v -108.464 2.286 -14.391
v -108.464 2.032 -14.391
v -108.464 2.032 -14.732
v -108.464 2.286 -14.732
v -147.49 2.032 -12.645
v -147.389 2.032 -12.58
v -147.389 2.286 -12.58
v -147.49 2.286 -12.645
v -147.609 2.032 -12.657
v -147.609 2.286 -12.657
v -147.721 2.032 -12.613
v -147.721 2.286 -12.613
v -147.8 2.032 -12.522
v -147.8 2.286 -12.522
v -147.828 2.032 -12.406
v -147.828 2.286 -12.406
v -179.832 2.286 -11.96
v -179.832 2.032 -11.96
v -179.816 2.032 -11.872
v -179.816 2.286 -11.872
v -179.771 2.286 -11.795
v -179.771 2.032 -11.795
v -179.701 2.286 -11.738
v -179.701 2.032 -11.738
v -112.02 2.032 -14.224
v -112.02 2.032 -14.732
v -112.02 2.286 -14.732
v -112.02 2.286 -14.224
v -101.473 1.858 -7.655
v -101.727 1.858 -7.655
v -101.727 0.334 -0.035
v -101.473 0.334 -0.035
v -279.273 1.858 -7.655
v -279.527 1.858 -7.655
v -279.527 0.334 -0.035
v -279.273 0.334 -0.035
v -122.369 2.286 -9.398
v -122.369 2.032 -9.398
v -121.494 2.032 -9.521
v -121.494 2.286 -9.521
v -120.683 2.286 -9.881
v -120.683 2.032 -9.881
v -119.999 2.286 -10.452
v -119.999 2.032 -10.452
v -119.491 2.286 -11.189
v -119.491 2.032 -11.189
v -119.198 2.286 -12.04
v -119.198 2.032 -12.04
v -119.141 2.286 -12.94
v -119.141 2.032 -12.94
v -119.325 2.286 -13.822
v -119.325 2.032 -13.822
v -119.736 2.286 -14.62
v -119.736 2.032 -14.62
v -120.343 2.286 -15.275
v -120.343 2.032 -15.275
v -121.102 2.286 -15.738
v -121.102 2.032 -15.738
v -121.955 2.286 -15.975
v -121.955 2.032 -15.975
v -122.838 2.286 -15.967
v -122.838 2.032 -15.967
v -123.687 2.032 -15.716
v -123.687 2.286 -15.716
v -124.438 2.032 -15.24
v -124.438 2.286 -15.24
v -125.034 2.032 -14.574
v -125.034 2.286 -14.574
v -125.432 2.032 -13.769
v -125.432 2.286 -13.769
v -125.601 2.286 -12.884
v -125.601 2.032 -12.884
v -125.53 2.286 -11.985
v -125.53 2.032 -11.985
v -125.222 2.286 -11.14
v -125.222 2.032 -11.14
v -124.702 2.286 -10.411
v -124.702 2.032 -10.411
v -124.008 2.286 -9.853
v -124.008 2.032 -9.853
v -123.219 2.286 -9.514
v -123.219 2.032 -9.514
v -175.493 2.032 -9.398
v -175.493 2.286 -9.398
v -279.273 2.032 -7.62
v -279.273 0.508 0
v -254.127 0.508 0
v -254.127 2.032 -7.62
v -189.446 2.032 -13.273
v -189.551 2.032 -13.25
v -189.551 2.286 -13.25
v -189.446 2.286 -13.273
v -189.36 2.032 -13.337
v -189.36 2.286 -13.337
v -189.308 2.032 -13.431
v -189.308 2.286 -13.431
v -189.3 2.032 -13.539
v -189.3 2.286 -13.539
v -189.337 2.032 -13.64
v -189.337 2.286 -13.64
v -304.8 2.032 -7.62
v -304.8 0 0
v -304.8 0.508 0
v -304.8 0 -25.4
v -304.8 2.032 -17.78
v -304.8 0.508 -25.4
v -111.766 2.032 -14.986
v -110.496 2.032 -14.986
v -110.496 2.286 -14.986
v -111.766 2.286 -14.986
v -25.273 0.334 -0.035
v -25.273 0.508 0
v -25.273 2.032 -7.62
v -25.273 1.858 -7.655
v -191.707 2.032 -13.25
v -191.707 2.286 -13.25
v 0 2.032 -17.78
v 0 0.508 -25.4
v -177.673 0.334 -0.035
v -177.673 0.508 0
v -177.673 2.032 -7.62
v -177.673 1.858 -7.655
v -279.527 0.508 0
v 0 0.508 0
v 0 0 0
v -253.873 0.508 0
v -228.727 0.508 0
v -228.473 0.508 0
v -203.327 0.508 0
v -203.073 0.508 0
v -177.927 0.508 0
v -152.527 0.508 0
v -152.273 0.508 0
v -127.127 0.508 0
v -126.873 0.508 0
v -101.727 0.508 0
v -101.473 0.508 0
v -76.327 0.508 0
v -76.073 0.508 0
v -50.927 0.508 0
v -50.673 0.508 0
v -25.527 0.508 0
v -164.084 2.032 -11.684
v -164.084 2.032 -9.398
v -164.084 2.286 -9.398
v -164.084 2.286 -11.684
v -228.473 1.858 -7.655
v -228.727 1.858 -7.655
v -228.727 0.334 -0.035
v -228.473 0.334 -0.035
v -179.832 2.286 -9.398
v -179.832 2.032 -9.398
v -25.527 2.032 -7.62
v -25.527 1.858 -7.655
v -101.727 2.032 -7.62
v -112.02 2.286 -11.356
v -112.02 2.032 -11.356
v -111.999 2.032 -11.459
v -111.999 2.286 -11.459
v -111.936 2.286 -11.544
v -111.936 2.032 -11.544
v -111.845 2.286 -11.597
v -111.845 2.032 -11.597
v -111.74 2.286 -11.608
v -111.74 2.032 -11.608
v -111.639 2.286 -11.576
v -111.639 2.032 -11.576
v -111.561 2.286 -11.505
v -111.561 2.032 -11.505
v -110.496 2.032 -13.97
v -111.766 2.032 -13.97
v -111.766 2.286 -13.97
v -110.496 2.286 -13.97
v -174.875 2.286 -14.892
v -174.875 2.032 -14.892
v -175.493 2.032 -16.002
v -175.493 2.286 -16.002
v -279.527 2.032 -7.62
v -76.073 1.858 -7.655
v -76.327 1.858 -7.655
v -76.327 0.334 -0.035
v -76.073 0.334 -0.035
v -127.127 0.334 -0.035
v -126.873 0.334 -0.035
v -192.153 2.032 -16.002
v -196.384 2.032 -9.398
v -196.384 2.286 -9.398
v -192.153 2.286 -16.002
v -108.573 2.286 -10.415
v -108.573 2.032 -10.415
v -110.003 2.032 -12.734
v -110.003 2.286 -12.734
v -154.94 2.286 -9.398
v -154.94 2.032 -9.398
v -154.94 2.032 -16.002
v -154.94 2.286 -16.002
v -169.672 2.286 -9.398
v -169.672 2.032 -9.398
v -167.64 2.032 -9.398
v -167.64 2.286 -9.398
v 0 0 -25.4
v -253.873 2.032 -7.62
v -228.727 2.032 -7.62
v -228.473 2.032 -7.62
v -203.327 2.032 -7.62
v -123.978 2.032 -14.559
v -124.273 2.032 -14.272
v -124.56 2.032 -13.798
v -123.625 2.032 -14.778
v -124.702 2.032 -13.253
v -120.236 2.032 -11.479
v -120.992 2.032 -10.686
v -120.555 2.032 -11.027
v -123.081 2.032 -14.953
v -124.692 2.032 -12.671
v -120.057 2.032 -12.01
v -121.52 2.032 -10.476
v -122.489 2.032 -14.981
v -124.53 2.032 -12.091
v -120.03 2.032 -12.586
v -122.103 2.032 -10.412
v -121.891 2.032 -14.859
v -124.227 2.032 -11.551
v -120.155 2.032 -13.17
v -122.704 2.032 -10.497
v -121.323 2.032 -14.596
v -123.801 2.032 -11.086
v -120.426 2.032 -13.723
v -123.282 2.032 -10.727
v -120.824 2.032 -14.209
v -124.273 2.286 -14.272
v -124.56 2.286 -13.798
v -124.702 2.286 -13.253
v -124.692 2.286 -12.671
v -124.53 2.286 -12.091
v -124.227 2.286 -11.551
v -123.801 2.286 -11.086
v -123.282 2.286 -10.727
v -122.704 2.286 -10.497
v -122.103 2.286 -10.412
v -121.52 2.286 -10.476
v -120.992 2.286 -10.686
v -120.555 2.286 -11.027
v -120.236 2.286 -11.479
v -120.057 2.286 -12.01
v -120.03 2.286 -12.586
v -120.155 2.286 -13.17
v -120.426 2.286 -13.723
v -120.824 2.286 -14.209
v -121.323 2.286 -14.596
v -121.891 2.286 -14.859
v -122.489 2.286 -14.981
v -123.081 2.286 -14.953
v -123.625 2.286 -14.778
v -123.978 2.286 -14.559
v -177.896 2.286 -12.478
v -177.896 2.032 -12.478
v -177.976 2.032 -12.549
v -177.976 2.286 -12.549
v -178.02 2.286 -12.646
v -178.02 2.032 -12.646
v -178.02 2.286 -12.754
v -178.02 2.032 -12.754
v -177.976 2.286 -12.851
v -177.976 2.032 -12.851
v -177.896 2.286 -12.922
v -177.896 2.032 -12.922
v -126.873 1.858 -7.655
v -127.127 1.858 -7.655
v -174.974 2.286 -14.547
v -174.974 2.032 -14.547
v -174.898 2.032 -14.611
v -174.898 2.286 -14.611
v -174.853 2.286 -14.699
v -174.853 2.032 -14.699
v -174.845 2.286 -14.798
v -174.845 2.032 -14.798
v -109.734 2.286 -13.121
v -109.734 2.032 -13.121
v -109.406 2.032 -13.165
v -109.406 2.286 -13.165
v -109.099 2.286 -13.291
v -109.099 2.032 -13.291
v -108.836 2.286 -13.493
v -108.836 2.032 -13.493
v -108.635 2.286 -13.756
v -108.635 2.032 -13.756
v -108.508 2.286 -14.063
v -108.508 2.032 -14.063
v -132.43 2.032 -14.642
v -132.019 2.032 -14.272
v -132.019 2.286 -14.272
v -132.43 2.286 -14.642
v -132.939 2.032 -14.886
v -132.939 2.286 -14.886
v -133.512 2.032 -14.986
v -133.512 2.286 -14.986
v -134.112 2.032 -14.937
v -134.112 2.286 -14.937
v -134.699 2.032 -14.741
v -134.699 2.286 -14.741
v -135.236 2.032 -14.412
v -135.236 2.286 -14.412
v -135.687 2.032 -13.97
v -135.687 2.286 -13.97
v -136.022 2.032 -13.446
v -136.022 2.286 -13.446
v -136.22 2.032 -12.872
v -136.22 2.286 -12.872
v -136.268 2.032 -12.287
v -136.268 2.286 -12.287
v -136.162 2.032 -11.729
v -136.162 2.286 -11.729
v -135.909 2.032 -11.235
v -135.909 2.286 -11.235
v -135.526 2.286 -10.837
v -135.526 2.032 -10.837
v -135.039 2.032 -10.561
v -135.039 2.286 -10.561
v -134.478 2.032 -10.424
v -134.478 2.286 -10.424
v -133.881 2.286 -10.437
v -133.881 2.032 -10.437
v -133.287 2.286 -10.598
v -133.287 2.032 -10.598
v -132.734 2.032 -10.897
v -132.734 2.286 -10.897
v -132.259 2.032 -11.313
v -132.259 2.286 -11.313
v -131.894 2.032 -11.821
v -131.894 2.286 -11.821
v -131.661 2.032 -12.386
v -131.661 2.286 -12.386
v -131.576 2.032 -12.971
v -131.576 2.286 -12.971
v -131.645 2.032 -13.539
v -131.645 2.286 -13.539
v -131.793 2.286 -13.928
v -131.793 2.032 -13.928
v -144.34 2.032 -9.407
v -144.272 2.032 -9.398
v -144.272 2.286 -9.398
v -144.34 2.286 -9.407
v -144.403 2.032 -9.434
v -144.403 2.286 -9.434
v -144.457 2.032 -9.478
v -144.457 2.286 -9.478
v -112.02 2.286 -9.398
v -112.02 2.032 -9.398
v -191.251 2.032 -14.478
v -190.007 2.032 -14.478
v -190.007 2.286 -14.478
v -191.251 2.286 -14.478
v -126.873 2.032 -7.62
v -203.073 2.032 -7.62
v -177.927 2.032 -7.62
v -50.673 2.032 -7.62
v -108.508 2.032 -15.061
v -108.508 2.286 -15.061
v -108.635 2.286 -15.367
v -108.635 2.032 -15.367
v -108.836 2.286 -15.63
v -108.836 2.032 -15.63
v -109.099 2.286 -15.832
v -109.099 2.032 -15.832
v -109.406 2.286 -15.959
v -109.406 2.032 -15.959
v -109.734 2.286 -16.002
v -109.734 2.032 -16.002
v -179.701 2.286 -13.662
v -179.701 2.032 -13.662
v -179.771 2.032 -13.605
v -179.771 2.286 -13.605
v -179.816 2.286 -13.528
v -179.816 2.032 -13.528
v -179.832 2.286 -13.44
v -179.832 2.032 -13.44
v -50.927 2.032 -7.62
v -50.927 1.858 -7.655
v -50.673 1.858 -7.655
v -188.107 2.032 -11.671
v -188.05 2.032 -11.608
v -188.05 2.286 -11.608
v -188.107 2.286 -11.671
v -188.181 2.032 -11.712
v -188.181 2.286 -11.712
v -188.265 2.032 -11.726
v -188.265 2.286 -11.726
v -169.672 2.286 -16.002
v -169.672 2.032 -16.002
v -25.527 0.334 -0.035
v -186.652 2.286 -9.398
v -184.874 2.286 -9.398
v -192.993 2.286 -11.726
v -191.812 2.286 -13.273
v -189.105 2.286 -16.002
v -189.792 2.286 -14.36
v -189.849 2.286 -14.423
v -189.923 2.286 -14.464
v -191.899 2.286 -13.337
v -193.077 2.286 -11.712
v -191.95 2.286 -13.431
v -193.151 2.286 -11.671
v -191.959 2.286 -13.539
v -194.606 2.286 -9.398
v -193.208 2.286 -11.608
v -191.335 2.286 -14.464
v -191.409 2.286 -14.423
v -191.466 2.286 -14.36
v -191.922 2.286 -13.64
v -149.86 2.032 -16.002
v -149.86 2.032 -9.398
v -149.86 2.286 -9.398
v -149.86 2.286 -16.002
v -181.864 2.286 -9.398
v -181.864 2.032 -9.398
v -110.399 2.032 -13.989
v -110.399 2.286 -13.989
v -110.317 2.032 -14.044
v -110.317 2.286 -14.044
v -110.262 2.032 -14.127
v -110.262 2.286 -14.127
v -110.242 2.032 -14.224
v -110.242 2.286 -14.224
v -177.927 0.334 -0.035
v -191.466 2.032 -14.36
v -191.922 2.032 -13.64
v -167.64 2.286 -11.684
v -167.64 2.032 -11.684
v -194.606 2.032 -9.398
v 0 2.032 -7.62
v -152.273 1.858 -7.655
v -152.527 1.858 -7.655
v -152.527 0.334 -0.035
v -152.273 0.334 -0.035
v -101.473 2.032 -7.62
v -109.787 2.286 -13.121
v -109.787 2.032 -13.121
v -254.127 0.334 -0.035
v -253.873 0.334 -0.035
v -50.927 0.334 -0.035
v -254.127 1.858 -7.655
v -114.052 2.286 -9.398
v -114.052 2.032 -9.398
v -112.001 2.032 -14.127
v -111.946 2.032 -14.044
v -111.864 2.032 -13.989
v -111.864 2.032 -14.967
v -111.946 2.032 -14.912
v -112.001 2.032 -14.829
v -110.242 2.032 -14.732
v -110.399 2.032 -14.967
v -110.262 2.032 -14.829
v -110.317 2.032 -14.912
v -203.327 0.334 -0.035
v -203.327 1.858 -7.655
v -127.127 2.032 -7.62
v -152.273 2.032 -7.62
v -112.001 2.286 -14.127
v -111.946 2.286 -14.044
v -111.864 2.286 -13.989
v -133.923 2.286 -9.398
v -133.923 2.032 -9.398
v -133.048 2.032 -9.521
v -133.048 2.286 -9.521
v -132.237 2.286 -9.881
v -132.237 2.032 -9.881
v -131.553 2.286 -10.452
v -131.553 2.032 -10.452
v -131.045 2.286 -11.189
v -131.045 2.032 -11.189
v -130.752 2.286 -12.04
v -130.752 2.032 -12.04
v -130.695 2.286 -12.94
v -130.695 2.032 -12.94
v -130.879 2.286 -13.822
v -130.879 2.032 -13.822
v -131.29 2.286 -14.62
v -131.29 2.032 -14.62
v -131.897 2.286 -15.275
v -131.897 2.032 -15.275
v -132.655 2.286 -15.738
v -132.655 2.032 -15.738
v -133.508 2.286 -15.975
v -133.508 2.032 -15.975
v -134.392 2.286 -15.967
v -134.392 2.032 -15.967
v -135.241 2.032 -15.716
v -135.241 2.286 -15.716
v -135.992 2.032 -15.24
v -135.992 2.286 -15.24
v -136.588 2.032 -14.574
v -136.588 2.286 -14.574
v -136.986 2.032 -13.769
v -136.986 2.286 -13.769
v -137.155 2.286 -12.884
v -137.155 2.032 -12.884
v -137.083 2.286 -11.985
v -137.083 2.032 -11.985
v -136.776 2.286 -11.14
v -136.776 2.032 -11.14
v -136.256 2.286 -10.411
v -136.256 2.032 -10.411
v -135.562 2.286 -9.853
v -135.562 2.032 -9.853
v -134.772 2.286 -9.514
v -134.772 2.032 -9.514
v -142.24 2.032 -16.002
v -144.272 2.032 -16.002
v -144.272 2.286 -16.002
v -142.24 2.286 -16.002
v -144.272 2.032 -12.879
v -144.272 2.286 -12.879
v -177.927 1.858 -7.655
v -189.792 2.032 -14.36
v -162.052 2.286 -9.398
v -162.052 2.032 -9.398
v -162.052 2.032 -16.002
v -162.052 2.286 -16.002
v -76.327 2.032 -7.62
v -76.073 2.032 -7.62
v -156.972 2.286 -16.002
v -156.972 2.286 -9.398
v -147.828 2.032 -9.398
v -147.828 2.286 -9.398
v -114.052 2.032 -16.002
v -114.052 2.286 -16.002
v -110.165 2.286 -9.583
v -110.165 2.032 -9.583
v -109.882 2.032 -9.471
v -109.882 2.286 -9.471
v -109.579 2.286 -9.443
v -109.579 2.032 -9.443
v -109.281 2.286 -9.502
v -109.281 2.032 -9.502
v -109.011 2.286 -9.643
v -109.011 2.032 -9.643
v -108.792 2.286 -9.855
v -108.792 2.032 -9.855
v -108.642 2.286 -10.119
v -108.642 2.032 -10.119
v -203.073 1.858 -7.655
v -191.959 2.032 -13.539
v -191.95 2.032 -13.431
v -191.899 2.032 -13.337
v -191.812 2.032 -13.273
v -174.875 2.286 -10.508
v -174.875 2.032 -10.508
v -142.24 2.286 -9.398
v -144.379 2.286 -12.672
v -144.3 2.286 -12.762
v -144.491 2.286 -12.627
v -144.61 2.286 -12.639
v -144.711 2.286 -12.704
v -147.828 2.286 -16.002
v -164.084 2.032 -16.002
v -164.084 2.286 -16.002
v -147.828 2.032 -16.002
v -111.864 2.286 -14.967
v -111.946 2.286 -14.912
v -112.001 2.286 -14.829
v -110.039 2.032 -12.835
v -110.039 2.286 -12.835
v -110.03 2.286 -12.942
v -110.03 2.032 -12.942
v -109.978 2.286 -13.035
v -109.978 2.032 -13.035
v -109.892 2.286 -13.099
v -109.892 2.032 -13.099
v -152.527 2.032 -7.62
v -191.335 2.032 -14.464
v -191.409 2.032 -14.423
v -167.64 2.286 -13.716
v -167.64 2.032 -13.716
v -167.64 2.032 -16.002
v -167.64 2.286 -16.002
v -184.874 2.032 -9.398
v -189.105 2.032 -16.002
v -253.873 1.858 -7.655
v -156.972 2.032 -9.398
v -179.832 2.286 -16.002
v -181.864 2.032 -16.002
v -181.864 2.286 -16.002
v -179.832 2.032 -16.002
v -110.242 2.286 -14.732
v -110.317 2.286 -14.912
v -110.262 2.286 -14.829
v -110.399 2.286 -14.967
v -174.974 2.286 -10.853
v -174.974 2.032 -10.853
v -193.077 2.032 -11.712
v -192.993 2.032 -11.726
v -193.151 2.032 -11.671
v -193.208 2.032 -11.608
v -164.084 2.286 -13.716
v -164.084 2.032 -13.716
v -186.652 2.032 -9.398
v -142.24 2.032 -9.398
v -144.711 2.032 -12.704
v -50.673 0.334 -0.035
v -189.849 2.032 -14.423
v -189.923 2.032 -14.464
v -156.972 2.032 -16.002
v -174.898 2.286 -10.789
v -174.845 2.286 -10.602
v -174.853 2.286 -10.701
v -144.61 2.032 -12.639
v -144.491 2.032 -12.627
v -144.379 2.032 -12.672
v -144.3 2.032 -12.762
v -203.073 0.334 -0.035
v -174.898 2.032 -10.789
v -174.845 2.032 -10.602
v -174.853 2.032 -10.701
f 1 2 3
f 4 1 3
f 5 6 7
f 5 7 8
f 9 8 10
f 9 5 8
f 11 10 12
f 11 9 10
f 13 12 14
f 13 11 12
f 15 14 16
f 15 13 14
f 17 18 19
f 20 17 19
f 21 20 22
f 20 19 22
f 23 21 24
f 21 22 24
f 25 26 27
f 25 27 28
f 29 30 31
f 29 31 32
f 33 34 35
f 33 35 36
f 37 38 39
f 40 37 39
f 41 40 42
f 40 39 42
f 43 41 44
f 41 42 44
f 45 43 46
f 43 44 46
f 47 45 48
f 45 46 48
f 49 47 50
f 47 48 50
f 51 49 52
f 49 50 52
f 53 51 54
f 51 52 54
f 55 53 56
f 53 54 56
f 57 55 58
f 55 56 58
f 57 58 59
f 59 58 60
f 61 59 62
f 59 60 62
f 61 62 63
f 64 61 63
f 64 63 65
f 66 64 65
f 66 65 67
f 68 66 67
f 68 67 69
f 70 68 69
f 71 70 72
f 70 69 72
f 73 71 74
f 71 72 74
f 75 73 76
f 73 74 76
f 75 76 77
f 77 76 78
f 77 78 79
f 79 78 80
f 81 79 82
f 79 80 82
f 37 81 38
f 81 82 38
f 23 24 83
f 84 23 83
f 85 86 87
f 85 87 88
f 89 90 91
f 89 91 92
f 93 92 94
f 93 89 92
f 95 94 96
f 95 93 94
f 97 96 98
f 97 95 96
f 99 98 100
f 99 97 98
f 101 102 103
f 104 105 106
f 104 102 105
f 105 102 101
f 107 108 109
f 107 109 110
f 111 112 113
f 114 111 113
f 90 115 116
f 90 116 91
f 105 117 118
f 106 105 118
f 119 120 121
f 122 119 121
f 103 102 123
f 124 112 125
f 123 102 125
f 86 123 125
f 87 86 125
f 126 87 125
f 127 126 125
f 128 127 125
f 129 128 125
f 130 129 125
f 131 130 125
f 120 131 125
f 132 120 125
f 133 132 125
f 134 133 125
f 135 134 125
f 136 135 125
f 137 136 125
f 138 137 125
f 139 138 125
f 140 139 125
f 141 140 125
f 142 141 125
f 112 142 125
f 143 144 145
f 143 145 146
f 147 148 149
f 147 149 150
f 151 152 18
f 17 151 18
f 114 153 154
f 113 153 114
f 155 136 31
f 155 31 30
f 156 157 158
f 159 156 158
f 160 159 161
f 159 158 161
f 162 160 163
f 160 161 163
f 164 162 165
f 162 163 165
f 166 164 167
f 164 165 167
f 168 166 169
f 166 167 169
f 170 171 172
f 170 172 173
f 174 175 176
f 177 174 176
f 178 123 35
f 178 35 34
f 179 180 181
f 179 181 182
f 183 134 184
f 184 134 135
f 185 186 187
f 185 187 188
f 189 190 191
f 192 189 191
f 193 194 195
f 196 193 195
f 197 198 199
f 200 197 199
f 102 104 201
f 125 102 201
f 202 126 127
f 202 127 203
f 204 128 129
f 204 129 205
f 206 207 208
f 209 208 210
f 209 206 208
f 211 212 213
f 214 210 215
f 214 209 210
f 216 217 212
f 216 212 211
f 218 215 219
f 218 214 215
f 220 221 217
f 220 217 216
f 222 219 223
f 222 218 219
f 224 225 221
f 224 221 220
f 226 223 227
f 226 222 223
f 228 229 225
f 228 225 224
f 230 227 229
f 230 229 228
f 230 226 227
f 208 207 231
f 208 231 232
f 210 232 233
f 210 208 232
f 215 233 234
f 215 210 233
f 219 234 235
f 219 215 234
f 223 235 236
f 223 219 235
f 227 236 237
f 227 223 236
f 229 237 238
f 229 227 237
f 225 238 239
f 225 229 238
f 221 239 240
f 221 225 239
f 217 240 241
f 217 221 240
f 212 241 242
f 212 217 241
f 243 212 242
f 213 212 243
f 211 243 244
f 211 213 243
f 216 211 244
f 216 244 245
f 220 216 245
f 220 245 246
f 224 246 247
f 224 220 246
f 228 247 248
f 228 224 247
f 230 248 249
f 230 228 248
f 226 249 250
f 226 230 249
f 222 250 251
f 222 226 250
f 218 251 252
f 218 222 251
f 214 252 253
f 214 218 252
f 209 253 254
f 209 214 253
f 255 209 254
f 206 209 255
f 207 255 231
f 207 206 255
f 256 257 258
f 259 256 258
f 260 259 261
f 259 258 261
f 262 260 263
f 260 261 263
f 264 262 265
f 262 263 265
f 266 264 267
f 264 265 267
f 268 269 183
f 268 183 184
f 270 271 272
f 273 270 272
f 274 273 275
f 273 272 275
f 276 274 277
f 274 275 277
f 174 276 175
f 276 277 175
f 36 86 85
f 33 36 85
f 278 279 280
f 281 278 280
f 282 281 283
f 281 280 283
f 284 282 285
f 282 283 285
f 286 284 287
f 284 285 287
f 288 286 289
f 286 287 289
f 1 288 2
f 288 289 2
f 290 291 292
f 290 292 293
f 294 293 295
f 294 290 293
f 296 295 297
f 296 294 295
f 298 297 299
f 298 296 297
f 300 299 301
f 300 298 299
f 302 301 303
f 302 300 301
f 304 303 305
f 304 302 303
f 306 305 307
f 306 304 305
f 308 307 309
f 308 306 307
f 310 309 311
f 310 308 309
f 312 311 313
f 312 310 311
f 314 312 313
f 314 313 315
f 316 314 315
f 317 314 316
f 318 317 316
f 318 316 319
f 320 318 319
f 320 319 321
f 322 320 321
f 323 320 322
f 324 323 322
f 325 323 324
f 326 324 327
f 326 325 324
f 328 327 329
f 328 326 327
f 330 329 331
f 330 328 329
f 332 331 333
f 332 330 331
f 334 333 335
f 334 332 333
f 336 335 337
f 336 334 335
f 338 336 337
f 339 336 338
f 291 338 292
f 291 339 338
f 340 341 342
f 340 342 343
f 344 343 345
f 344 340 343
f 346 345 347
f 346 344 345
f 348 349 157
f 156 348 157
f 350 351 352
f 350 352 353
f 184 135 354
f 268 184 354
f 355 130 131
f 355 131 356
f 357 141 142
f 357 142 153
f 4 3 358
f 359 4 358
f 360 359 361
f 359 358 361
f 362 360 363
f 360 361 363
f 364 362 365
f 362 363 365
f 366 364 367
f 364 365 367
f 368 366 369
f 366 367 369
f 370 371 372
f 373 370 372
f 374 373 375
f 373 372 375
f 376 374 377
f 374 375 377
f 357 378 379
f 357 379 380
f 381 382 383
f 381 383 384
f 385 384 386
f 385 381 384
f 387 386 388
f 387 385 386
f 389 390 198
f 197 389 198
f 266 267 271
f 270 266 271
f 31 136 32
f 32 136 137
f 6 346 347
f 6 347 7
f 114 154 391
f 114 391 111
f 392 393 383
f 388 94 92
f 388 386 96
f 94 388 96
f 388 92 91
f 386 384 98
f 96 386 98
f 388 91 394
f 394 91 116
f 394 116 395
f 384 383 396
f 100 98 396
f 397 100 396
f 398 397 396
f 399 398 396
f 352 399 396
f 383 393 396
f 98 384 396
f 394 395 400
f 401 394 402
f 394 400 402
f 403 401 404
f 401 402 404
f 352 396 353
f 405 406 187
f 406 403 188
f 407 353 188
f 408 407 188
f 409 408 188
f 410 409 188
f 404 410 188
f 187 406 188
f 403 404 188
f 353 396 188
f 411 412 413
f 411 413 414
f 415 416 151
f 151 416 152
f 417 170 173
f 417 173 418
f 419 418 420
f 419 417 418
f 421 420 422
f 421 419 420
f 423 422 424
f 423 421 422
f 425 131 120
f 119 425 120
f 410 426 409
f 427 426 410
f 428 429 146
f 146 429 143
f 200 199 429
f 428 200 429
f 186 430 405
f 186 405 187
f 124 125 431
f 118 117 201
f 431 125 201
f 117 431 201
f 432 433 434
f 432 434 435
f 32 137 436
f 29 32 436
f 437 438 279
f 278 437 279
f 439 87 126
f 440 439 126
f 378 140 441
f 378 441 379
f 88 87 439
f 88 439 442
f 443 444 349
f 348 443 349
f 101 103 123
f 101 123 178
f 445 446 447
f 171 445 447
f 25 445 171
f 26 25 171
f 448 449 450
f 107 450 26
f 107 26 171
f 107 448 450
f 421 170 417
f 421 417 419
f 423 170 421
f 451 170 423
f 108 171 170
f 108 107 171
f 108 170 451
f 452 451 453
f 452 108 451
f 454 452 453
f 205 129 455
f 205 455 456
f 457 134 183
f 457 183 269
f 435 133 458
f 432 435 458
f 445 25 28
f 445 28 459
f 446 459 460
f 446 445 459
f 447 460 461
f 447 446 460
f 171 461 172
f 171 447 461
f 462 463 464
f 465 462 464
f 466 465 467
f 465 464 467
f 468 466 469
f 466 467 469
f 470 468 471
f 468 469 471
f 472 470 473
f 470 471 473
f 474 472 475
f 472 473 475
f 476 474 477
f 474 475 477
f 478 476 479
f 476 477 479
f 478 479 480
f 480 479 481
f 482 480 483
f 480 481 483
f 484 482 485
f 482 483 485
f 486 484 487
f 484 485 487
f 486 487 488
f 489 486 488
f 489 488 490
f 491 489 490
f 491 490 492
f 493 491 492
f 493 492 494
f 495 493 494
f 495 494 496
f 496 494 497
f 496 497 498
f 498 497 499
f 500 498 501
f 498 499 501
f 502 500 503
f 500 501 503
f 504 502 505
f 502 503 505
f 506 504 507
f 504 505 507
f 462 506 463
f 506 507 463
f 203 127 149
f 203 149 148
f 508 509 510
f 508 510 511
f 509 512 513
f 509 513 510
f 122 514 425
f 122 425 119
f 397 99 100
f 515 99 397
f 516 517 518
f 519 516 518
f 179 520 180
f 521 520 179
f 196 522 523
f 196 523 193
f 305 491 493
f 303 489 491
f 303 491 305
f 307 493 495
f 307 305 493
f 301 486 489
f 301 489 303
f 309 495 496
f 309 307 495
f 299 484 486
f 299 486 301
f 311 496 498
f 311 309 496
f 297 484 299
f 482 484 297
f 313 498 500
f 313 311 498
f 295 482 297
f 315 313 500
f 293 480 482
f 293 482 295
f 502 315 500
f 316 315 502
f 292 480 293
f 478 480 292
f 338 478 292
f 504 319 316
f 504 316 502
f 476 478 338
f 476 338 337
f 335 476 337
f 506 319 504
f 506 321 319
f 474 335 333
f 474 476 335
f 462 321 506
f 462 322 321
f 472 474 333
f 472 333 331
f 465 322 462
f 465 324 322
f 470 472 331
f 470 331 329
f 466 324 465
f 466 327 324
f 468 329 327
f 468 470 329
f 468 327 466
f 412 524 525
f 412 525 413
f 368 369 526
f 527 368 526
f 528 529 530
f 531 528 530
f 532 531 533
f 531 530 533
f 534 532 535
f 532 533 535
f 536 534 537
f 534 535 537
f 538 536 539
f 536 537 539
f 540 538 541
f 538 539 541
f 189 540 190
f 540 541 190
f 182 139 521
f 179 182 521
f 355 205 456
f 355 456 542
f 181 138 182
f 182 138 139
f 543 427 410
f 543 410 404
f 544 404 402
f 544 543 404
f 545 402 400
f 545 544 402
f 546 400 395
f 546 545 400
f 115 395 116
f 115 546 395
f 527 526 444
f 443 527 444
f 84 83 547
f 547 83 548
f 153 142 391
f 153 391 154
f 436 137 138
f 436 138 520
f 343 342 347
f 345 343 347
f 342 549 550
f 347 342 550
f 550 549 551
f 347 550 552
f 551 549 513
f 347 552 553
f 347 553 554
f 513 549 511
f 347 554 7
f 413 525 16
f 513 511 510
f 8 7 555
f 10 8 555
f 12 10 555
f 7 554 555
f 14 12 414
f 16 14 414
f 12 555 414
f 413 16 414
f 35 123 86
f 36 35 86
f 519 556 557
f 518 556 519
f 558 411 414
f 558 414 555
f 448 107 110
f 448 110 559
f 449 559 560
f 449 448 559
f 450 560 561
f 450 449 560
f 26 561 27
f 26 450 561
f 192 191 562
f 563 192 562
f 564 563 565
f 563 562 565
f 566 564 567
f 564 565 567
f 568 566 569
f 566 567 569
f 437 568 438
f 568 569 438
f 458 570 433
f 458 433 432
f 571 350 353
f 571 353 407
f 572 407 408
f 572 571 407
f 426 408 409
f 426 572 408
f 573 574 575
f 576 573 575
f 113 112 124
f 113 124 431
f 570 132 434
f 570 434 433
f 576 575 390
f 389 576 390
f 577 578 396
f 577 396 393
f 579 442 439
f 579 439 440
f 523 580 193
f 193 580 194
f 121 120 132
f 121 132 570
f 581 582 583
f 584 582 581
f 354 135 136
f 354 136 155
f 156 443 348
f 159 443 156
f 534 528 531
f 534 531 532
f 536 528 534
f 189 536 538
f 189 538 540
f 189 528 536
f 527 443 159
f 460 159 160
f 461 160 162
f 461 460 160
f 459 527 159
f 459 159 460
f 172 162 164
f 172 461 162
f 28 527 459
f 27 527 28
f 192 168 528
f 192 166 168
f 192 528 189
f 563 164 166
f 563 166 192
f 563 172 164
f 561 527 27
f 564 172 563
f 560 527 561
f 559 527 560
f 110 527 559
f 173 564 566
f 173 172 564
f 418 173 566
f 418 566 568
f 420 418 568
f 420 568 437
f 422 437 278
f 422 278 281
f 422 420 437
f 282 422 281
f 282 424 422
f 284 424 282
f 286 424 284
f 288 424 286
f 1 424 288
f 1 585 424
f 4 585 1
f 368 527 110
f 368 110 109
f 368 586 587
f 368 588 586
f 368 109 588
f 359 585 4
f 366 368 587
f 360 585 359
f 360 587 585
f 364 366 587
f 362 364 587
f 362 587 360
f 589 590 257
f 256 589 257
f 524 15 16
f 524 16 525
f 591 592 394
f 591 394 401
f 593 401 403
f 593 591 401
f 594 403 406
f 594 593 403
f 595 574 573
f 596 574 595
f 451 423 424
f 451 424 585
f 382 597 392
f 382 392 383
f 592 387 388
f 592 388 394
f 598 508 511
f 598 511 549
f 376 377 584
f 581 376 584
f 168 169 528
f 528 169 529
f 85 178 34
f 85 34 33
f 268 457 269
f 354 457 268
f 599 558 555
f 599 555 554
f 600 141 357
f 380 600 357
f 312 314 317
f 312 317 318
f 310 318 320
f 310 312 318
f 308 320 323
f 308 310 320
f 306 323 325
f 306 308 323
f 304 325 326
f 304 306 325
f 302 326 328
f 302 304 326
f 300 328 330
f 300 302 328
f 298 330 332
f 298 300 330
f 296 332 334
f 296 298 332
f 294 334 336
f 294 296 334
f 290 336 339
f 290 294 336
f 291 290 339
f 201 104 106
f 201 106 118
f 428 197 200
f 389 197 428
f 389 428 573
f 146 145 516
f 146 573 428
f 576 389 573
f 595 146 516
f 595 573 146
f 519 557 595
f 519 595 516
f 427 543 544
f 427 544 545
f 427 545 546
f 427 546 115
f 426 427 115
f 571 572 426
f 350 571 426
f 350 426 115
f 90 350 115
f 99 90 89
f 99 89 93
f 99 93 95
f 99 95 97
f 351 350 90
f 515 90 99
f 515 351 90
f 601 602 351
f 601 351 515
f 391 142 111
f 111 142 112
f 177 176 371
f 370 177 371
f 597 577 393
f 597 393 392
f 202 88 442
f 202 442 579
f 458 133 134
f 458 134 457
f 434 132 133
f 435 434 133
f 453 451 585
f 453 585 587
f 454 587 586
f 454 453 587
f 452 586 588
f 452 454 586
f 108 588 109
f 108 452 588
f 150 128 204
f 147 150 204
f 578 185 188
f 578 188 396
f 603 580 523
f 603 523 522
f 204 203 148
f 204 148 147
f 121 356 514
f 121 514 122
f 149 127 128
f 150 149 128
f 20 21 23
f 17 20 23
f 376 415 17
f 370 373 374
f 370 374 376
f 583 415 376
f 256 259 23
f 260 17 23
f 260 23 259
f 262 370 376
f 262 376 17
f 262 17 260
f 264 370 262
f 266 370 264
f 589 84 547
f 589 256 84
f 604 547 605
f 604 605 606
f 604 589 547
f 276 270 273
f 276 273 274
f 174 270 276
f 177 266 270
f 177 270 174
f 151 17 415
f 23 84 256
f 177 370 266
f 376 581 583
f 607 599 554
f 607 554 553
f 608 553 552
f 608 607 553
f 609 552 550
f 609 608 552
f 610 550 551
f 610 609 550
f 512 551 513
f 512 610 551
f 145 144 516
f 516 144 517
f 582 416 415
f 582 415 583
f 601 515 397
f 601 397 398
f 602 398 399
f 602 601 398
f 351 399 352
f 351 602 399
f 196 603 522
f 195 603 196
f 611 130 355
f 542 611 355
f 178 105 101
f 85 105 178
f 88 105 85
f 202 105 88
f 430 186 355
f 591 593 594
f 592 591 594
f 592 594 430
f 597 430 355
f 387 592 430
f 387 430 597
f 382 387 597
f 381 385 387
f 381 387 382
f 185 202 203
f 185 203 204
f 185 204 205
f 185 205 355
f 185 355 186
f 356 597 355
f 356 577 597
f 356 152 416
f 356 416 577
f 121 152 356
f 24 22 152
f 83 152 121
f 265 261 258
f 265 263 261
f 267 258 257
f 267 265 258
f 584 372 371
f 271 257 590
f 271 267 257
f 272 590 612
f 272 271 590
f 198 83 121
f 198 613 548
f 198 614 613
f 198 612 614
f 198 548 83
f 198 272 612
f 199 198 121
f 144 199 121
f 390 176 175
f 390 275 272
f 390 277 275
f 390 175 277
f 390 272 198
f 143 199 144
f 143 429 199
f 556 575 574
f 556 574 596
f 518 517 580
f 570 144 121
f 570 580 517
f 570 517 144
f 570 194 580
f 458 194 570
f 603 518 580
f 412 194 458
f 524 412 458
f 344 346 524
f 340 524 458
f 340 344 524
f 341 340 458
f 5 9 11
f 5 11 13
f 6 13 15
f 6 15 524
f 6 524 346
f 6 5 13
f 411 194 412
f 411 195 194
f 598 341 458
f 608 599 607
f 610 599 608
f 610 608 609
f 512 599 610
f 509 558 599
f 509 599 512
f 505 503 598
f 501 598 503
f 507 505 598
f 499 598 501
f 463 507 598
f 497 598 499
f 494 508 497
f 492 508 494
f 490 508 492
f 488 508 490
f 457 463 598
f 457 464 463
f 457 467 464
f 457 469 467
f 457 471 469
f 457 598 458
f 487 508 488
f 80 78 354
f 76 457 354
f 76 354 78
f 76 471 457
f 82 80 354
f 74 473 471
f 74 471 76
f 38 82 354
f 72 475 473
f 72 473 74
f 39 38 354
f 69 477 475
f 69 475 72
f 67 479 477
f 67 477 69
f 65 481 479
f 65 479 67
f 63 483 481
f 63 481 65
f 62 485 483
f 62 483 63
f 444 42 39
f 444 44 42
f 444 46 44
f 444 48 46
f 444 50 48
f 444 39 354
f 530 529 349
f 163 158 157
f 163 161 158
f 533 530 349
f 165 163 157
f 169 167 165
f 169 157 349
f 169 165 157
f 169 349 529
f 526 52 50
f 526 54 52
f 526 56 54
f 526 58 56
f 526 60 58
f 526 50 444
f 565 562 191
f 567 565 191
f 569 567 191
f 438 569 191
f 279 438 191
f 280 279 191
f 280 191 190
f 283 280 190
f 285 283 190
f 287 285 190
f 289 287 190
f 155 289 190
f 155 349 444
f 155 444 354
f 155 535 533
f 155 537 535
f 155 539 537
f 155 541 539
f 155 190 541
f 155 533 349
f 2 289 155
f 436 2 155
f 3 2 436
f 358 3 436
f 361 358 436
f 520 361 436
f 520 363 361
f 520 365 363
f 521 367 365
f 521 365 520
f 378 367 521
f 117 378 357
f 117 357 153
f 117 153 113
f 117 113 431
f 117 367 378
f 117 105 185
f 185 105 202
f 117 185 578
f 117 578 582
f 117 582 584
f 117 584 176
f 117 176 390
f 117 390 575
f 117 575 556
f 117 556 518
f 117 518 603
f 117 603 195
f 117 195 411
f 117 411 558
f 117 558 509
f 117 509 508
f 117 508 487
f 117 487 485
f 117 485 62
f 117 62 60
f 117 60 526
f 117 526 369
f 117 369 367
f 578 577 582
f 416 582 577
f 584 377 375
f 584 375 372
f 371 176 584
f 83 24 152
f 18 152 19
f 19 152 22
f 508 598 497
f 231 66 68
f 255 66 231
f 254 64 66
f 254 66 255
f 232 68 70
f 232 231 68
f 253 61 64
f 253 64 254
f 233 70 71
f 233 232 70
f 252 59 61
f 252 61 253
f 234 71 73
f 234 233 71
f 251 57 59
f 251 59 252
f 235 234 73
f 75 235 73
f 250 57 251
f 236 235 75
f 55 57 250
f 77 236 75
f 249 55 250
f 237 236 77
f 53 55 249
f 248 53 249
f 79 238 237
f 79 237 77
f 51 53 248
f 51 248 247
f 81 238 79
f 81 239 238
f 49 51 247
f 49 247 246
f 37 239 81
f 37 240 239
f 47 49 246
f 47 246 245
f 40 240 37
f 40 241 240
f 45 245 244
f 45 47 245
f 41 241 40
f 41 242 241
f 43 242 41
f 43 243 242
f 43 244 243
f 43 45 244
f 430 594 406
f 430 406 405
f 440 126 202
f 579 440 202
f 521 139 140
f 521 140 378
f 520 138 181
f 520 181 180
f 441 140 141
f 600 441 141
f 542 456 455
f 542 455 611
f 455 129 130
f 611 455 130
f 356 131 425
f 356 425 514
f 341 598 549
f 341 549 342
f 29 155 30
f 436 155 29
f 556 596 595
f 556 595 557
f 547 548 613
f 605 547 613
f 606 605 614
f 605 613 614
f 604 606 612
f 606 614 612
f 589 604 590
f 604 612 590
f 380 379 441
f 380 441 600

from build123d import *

# Parameters (mm, degrees)
SKETCH1_W           = 304.8
SKETCH1_H           = 25.4
BOSS_EXTRUDE1_DEPTH = 2.032
SKETCH2_OUTSIDE_W   = 88.572
SKETCH2_OUTSIDE_H   = 65.204
CUT_EXTRUDE2_DEPTH  = 306.863252163
SKETCH4_W           = 2.032
SKETCH4_H           = 6.604
SKETCH4_W_2         = 3.556
SKETCH4_H_2         = 2.032
SKETCH4_RX          = 3.302
SKETCH4_RY          = 3.236880332
SKETCH4_RX_2        = 2.468882323
SKETCH4_RY_2        = 2.157115795
BOSS_EXTRUDE2_DEPTH = 0.254
SKETCH5_W           = 0.254
SKETCH5_H           = 7.770905738
CUT_EXTRUDE9_DEPTH  = 0.1778


with BuildPart() as part:
    # Sketch1 → Boss-Extrude1 (new body)
    with BuildSketch(Plane(origin=(0, 0, 0), x_dir=(1, 0, 0), z_dir=(0, 1, 0))):
        with Locations((-152.4, 12.7)):
            Rectangle(SKETCH1_W, SKETCH1_H)
    extrude(amount=BOSS_EXTRUDE1_DEPTH)

    # Sketch2 outside → Cut-Extrude2 (cut, through all)
    with BuildSketch(Plane(origin=(0, 0, 0), x_dir=(0, 0, -1), z_dir=(1, 0, 0))):
        with Locations((12.7, 1.016)):
            Rectangle(SKETCH2_OUTSIDE_W, SKETCH2_OUTSIDE_H)
        Polygon((0, 0.508), (7.62, 2.032), (12.7, 2.032), (17.78, 2.032), (25.4, 0.508), (25.4, 0), (0, 0), align=None, mode=Mode.SUBTRACT)
    extrude(amount=-CUT_EXTRUDE2_DEPTH, mode=Mode.SUBTRACT)

    # Sketch4 → Boss-Extrude2 (add)
    # profile 1 of 11: a face of its own
    with BuildSketch(Plane(origin=(0, 2.032, 0), x_dir=(1, 0, 0), z_dir=(0, 1, 0))):
        with Locations((-180.848, 12.7)):
            Rectangle(SKETCH4_W, SKETCH4_H)
    # profile 2 of 11: a face of its own
    with BuildSketch(Plane(origin=(0, 2.032, 0), x_dir=(1, 0, 0), z_dir=(0, 1, 0))):
        with BuildLine():
            ThreePointArc((-179.701441188, 13.661600321), (-179.796940702, 13.568380332), (-179.832, 13.43961322))
            Line((-179.832, 13.43961322), (-179.832, 12.7))
            Line((-179.832, 12.7), (-179.832, 11.96038678))
            ThreePointArc((-179.832, 11.96038678), (-179.796940702, 11.831619668), (-179.701441188, 11.738399679))
            Line((-179.701441188, 11.738399679), (-175.49264713, 9.398))
            Line((-175.49264713, 9.398), (-174.875441188, 10.507935505))
            ThreePointArc((-174.875441188, 10.507935505), (-174.853173604, 10.701059177), (-174.973987101, 10.853363795))
            Line((-174.973987101, 10.853363795), (-177.895630596, 12.478012899))
            ThreePointArc((-177.895630596, 12.478012899), (-178.026189408, 12.7), (-177.895630596, 12.921987101))
            Line((-177.895630596, 12.921987101), (-174.973987101, 14.546636205))
            ThreePointArc((-174.973987101, 14.546636205), (-174.853173604, 14.698940823), (-174.875441188, 14.892064495))
            Line((-174.875441188, 14.892064495), (-175.49264713, 16.002))
            Line((-175.49264713, 16.002), (-179.701441188, 13.661600321))
        make_face()
    # profile 3 of 11: a face of its own
    with BuildSketch(Plane(origin=(0, 2.032, 0), x_dir=(1, 0, 0), z_dir=(0, 1, 0))):
        Polygon((-167.64, 11.684), (-167.64, 13.716), (-167.64, 16.002), (-169.672, 16.002), (-169.672, 9.398), (-167.64, 9.398), align=None)
    # profile 4 of 11: a face of its own
    with BuildSketch(Plane(origin=(0, 2.032, 0), x_dir=(1, 0, 0), z_dir=(0, 1, 0))):
        with Locations((-163.068, 12.7)):
            Rectangle(SKETCH4_W, SKETCH4_H)
    # profile 5 of 11: a face of its own
    with BuildSketch(Plane(origin=(0, 2.032, 0), x_dir=(1, 0, 0), z_dir=(0, 1, 0))):
        with Locations((-165.862, 12.7)):
            Rectangle(SKETCH4_W_2, SKETCH4_H_2)
    # profile 6 of 11: a face of its own
    with BuildSketch(Plane(origin=(0, 2.032, 0), x_dir=(1, 0, 0), z_dir=(0, 1, 0))):
        with Locations((-155.956, 12.7)):
            Rectangle(SKETCH4_W, SKETCH4_H)
    # profile 7 of 11: a face of its own
    with BuildSketch(Plane(origin=(0, 2.032, 0), x_dir=(1, 0, 0), z_dir=(0, 1, 0))):
        with BuildLine():
            ThreePointArc((-144.710582264, 12.704200751), (-144.432106164, 12.642678456), (-144.272, 12.878686819))
            Line((-144.272, 12.878686819), (-144.272, 16.002))
            Line((-144.272, 16.002), (-142.24, 16.002))
            Line((-142.24, 16.002), (-142.24, 9.398))
            Line((-142.24, 9.398), (-144.272, 9.398))
            ThreePointArc((-144.272, 9.398), (-144.372490146, 9.418723918), (-144.456582264, 9.477513932))
            Line((-144.456582264, 9.477513932), (-147.389417736, 12.58005053))
            ThreePointArc((-147.389417736, 12.58005053), (-147.667893836, 12.641572825), (-147.828, 12.405564462))
            Line((-147.828, 12.405564462), (-147.828, 9.398))
            Line((-147.828, 9.398), (-149.86, 9.398))
            Line((-149.86, 9.398), (-149.86, 16.002))
            Line((-149.86, 16.002), (-147.828, 16.002))
            Line((-147.828, 16.002), (-144.710582264, 12.704200751))
        make_face()
    # profile 8 of 11: a face of its own
    with BuildSketch(Plane(origin=(0, 2.032, 0), x_dir=(1, 0, 0), z_dir=(0, 1, 0))):
        with Locations(Location((-133.923119668, 12.7), (0, 0, -90))):
            Ellipse(SKETCH4_RX, SKETCH4_RY)
        with Locations(Location((-133.923119668, 12.7), (0, 0, 39.538825136))):
            Ellipse(SKETCH4_RX_2, SKETCH4_RY_2, mode=Mode.SUBTRACT)
    # profile 9 of 11: a face of its own
    with BuildSketch(Plane(origin=(0, 2.032, 0), x_dir=(1, 0, 0), z_dir=(0, 1, 0))):
        with Locations(Location((-122.369359004, 12.7), (0, 0, -90))):
            Ellipse(SKETCH4_RX, SKETCH4_RY)
        with Locations(Location((-122.369359004, 12.7), (0, 0, 140.461174864))):
            Ellipse(SKETCH4_RX_2, SKETCH4_RY_2, mode=Mode.SUBTRACT)
    # profile 10 of 11: a face of its own
    with BuildSketch(Plane(origin=(0, 2.032, 0), x_dir=(1, 0, 0), z_dir=(0, 1, 0))):
        with BuildLine():
            Line((-111.560968993, 11.504926098), (-110.164699128, 9.582601219))
            ThreePointArc((-110.164699128, 9.582601219), (-109.140807711, 9.563074793), (-108.572707527, 10.415129425))
            Line((-108.572707527, 10.415129425), (-110.003457223, 12.733919497))
            ThreePointArc((-110.003457223, 12.733919497), (-110.009098265, 12.991067287), (-109.787294363, 13.121297223))
            Line((-109.787294363, 13.121297223), (-109.734478672, 13.121297223))
            ThreePointArc((-109.734478672, 13.121297223), (-108.83645306, 13.493271611), (-108.464478672, 14.391297223))
            Line((-108.464478672, 14.391297223), (-108.464478672, 14.732))
            ThreePointArc((-108.464478672, 14.732), (-108.83645306, 15.630025612), (-109.734478672, 16.002))
            Line((-109.734478672, 16.002), (-111.135692822, 16.002))
            Line((-111.135692822, 16.002), (-114.052478672, 16.002))
            Line((-114.052478672, 16.002), (-114.052478672, 9.398))
            Line((-114.052478672, 9.398), (-112.020478672, 9.398))
            Line((-112.020478672, 9.398), (-112.020478672, 11.355655298))
            ThreePointArc((-112.020478672, 11.355655298), (-111.844953323, 11.597228743), (-111.560968993, 11.504926098))
        make_face()
        with BuildLine():
            Line((-110.242478672, 14.224), (-110.242478672, 14.732))
            ThreePointArc((-110.242478672, 14.732), (-110.31687355, 14.911605122), (-110.496478672, 14.986))
            Line((-110.496478672, 14.986), (-111.766478672, 14.986))
            ThreePointArc((-111.766478672, 14.986), (-111.946083795, 14.911605122), (-112.020478672, 14.732))
            Line((-112.020478672, 14.732), (-112.020478672, 14.224))
            ThreePointArc((-112.020478672, 14.224), (-111.946083795, 14.044394878), (-111.766478672, 13.97))
            Line((-111.766478672, 13.97), (-110.496478672, 13.97))
            ThreePointArc((-110.496478672, 13.97), (-110.31687355, 14.044394878), (-110.242478672, 14.224))
        make_face(mode=Mode.SUBTRACT)
    # profile 11 of 11: a face of its own
    with BuildSketch(Plane(origin=(0, 2.032, 0), x_dir=(1, 0, 0), z_dir=(0, 1, 0))):
        with BuildLine():
            ThreePointArc((-188.050459309, 11.607699185), (-188.142583121, 11.694367018), (-188.265083498, 11.725859361))
            Line((-188.265083498, 11.725859361), (-192.993173567, 11.725859361))
            ThreePointArc((-192.993173567, 11.725859361), (-193.115673944, 11.694367018), (-193.207797756, 11.607699185))
            Line((-193.207797756, 11.607699185), (-194.606359356, 9.398))
            Line((-194.606359356, 9.398), (-196.384359356, 9.398))
            Line((-196.384359356, 9.398), (-192.153128533, 16.002))
            Line((-192.153128533, 16.002), (-190.629128533, 16.002))
            Line((-190.629128533, 16.002), (-189.105128533, 16.002))
            Line((-189.105128533, 16.002), (-184.873897709, 9.398))
            Line((-184.873897709, 9.398), (-186.651897709, 9.398))
            Line((-186.651897709, 9.398), (-188.050459309, 11.607699185))
        make_face()
        with BuildLine():
            ThreePointArc((-189.551175827, 13.249859361), (-189.32866817, 13.381358984), (-189.336551639, 13.639699185))
            Line((-189.336551639, 13.639699185), (-189.792342659, 14.359839824))
            ThreePointArc((-189.792342659, 14.359839824), (-189.88446647, 14.446507657), (-190.006966847, 14.478))
            Line((-190.006966847, 14.478), (-191.251290218, 14.478))
            ThreePointArc((-191.251290218, 14.478), (-191.373790595, 14.446507657), (-191.465914407, 14.359839824))
            Line((-191.465914407, 14.359839824), (-191.921705426, 13.639699185))
            ThreePointArc((-191.921705426, 13.639699185), (-191.929588895, 13.381358984), (-191.707081238, 13.249859361))
            Line((-191.707081238, 13.249859361), (-189.551175827, 13.249859361))
        make_face(mode=Mode.SUBTRACT)
    extrude(amount=BOSS_EXTRUDE2_DEPTH)

    # Sketch5 → Cut-Extrude9 (cut)
    with BuildSketch(Plane(origin=(0, 0.488461538, 0.097692308), x_dir=(1, 0, 0), z_dir=(0, 0.9805806756909202, 0.19611613513818354))):
        with Locations((-127, 3.985079866)):
            Rectangle(SKETCH5_W, SKETCH5_H)
        with Locations((-228.6, 3.985079866)):
            Rectangle(SKETCH5_W, SKETCH5_H)
        with Locations((-203.2, 3.985079866)):
            Rectangle(SKETCH5_W, SKETCH5_H)
        with Locations((-76.2, 3.985079866)):
            Rectangle(SKETCH5_W, SKETCH5_H)
        with Locations((-177.8, 3.985079866)):
            Rectangle(SKETCH5_W, SKETCH5_H)
        with Locations((-50.8, 3.985079866)):
            Rectangle(SKETCH5_W, SKETCH5_H)
        with Locations((-25.4, 3.985079866)):
            Rectangle(SKETCH5_W, SKETCH5_H)
        with Locations((-101.6, 3.985079866)):
            Rectangle(SKETCH5_W, SKETCH5_H)
        with Locations((-152.4, 3.985079866)):
            Rectangle(SKETCH5_W, SKETCH5_H)
        with Locations((-279.4, 3.985079866)):
            Rectangle(SKETCH5_W, SKETCH5_H)
        with Locations((-254, 3.985079866)):
            Rectangle(SKETCH5_W, SKETCH5_H)
    extrude(amount=-CUT_EXTRUDE9_DEPTH, mode=Mode.SUBTRACT)


solid = part.part
